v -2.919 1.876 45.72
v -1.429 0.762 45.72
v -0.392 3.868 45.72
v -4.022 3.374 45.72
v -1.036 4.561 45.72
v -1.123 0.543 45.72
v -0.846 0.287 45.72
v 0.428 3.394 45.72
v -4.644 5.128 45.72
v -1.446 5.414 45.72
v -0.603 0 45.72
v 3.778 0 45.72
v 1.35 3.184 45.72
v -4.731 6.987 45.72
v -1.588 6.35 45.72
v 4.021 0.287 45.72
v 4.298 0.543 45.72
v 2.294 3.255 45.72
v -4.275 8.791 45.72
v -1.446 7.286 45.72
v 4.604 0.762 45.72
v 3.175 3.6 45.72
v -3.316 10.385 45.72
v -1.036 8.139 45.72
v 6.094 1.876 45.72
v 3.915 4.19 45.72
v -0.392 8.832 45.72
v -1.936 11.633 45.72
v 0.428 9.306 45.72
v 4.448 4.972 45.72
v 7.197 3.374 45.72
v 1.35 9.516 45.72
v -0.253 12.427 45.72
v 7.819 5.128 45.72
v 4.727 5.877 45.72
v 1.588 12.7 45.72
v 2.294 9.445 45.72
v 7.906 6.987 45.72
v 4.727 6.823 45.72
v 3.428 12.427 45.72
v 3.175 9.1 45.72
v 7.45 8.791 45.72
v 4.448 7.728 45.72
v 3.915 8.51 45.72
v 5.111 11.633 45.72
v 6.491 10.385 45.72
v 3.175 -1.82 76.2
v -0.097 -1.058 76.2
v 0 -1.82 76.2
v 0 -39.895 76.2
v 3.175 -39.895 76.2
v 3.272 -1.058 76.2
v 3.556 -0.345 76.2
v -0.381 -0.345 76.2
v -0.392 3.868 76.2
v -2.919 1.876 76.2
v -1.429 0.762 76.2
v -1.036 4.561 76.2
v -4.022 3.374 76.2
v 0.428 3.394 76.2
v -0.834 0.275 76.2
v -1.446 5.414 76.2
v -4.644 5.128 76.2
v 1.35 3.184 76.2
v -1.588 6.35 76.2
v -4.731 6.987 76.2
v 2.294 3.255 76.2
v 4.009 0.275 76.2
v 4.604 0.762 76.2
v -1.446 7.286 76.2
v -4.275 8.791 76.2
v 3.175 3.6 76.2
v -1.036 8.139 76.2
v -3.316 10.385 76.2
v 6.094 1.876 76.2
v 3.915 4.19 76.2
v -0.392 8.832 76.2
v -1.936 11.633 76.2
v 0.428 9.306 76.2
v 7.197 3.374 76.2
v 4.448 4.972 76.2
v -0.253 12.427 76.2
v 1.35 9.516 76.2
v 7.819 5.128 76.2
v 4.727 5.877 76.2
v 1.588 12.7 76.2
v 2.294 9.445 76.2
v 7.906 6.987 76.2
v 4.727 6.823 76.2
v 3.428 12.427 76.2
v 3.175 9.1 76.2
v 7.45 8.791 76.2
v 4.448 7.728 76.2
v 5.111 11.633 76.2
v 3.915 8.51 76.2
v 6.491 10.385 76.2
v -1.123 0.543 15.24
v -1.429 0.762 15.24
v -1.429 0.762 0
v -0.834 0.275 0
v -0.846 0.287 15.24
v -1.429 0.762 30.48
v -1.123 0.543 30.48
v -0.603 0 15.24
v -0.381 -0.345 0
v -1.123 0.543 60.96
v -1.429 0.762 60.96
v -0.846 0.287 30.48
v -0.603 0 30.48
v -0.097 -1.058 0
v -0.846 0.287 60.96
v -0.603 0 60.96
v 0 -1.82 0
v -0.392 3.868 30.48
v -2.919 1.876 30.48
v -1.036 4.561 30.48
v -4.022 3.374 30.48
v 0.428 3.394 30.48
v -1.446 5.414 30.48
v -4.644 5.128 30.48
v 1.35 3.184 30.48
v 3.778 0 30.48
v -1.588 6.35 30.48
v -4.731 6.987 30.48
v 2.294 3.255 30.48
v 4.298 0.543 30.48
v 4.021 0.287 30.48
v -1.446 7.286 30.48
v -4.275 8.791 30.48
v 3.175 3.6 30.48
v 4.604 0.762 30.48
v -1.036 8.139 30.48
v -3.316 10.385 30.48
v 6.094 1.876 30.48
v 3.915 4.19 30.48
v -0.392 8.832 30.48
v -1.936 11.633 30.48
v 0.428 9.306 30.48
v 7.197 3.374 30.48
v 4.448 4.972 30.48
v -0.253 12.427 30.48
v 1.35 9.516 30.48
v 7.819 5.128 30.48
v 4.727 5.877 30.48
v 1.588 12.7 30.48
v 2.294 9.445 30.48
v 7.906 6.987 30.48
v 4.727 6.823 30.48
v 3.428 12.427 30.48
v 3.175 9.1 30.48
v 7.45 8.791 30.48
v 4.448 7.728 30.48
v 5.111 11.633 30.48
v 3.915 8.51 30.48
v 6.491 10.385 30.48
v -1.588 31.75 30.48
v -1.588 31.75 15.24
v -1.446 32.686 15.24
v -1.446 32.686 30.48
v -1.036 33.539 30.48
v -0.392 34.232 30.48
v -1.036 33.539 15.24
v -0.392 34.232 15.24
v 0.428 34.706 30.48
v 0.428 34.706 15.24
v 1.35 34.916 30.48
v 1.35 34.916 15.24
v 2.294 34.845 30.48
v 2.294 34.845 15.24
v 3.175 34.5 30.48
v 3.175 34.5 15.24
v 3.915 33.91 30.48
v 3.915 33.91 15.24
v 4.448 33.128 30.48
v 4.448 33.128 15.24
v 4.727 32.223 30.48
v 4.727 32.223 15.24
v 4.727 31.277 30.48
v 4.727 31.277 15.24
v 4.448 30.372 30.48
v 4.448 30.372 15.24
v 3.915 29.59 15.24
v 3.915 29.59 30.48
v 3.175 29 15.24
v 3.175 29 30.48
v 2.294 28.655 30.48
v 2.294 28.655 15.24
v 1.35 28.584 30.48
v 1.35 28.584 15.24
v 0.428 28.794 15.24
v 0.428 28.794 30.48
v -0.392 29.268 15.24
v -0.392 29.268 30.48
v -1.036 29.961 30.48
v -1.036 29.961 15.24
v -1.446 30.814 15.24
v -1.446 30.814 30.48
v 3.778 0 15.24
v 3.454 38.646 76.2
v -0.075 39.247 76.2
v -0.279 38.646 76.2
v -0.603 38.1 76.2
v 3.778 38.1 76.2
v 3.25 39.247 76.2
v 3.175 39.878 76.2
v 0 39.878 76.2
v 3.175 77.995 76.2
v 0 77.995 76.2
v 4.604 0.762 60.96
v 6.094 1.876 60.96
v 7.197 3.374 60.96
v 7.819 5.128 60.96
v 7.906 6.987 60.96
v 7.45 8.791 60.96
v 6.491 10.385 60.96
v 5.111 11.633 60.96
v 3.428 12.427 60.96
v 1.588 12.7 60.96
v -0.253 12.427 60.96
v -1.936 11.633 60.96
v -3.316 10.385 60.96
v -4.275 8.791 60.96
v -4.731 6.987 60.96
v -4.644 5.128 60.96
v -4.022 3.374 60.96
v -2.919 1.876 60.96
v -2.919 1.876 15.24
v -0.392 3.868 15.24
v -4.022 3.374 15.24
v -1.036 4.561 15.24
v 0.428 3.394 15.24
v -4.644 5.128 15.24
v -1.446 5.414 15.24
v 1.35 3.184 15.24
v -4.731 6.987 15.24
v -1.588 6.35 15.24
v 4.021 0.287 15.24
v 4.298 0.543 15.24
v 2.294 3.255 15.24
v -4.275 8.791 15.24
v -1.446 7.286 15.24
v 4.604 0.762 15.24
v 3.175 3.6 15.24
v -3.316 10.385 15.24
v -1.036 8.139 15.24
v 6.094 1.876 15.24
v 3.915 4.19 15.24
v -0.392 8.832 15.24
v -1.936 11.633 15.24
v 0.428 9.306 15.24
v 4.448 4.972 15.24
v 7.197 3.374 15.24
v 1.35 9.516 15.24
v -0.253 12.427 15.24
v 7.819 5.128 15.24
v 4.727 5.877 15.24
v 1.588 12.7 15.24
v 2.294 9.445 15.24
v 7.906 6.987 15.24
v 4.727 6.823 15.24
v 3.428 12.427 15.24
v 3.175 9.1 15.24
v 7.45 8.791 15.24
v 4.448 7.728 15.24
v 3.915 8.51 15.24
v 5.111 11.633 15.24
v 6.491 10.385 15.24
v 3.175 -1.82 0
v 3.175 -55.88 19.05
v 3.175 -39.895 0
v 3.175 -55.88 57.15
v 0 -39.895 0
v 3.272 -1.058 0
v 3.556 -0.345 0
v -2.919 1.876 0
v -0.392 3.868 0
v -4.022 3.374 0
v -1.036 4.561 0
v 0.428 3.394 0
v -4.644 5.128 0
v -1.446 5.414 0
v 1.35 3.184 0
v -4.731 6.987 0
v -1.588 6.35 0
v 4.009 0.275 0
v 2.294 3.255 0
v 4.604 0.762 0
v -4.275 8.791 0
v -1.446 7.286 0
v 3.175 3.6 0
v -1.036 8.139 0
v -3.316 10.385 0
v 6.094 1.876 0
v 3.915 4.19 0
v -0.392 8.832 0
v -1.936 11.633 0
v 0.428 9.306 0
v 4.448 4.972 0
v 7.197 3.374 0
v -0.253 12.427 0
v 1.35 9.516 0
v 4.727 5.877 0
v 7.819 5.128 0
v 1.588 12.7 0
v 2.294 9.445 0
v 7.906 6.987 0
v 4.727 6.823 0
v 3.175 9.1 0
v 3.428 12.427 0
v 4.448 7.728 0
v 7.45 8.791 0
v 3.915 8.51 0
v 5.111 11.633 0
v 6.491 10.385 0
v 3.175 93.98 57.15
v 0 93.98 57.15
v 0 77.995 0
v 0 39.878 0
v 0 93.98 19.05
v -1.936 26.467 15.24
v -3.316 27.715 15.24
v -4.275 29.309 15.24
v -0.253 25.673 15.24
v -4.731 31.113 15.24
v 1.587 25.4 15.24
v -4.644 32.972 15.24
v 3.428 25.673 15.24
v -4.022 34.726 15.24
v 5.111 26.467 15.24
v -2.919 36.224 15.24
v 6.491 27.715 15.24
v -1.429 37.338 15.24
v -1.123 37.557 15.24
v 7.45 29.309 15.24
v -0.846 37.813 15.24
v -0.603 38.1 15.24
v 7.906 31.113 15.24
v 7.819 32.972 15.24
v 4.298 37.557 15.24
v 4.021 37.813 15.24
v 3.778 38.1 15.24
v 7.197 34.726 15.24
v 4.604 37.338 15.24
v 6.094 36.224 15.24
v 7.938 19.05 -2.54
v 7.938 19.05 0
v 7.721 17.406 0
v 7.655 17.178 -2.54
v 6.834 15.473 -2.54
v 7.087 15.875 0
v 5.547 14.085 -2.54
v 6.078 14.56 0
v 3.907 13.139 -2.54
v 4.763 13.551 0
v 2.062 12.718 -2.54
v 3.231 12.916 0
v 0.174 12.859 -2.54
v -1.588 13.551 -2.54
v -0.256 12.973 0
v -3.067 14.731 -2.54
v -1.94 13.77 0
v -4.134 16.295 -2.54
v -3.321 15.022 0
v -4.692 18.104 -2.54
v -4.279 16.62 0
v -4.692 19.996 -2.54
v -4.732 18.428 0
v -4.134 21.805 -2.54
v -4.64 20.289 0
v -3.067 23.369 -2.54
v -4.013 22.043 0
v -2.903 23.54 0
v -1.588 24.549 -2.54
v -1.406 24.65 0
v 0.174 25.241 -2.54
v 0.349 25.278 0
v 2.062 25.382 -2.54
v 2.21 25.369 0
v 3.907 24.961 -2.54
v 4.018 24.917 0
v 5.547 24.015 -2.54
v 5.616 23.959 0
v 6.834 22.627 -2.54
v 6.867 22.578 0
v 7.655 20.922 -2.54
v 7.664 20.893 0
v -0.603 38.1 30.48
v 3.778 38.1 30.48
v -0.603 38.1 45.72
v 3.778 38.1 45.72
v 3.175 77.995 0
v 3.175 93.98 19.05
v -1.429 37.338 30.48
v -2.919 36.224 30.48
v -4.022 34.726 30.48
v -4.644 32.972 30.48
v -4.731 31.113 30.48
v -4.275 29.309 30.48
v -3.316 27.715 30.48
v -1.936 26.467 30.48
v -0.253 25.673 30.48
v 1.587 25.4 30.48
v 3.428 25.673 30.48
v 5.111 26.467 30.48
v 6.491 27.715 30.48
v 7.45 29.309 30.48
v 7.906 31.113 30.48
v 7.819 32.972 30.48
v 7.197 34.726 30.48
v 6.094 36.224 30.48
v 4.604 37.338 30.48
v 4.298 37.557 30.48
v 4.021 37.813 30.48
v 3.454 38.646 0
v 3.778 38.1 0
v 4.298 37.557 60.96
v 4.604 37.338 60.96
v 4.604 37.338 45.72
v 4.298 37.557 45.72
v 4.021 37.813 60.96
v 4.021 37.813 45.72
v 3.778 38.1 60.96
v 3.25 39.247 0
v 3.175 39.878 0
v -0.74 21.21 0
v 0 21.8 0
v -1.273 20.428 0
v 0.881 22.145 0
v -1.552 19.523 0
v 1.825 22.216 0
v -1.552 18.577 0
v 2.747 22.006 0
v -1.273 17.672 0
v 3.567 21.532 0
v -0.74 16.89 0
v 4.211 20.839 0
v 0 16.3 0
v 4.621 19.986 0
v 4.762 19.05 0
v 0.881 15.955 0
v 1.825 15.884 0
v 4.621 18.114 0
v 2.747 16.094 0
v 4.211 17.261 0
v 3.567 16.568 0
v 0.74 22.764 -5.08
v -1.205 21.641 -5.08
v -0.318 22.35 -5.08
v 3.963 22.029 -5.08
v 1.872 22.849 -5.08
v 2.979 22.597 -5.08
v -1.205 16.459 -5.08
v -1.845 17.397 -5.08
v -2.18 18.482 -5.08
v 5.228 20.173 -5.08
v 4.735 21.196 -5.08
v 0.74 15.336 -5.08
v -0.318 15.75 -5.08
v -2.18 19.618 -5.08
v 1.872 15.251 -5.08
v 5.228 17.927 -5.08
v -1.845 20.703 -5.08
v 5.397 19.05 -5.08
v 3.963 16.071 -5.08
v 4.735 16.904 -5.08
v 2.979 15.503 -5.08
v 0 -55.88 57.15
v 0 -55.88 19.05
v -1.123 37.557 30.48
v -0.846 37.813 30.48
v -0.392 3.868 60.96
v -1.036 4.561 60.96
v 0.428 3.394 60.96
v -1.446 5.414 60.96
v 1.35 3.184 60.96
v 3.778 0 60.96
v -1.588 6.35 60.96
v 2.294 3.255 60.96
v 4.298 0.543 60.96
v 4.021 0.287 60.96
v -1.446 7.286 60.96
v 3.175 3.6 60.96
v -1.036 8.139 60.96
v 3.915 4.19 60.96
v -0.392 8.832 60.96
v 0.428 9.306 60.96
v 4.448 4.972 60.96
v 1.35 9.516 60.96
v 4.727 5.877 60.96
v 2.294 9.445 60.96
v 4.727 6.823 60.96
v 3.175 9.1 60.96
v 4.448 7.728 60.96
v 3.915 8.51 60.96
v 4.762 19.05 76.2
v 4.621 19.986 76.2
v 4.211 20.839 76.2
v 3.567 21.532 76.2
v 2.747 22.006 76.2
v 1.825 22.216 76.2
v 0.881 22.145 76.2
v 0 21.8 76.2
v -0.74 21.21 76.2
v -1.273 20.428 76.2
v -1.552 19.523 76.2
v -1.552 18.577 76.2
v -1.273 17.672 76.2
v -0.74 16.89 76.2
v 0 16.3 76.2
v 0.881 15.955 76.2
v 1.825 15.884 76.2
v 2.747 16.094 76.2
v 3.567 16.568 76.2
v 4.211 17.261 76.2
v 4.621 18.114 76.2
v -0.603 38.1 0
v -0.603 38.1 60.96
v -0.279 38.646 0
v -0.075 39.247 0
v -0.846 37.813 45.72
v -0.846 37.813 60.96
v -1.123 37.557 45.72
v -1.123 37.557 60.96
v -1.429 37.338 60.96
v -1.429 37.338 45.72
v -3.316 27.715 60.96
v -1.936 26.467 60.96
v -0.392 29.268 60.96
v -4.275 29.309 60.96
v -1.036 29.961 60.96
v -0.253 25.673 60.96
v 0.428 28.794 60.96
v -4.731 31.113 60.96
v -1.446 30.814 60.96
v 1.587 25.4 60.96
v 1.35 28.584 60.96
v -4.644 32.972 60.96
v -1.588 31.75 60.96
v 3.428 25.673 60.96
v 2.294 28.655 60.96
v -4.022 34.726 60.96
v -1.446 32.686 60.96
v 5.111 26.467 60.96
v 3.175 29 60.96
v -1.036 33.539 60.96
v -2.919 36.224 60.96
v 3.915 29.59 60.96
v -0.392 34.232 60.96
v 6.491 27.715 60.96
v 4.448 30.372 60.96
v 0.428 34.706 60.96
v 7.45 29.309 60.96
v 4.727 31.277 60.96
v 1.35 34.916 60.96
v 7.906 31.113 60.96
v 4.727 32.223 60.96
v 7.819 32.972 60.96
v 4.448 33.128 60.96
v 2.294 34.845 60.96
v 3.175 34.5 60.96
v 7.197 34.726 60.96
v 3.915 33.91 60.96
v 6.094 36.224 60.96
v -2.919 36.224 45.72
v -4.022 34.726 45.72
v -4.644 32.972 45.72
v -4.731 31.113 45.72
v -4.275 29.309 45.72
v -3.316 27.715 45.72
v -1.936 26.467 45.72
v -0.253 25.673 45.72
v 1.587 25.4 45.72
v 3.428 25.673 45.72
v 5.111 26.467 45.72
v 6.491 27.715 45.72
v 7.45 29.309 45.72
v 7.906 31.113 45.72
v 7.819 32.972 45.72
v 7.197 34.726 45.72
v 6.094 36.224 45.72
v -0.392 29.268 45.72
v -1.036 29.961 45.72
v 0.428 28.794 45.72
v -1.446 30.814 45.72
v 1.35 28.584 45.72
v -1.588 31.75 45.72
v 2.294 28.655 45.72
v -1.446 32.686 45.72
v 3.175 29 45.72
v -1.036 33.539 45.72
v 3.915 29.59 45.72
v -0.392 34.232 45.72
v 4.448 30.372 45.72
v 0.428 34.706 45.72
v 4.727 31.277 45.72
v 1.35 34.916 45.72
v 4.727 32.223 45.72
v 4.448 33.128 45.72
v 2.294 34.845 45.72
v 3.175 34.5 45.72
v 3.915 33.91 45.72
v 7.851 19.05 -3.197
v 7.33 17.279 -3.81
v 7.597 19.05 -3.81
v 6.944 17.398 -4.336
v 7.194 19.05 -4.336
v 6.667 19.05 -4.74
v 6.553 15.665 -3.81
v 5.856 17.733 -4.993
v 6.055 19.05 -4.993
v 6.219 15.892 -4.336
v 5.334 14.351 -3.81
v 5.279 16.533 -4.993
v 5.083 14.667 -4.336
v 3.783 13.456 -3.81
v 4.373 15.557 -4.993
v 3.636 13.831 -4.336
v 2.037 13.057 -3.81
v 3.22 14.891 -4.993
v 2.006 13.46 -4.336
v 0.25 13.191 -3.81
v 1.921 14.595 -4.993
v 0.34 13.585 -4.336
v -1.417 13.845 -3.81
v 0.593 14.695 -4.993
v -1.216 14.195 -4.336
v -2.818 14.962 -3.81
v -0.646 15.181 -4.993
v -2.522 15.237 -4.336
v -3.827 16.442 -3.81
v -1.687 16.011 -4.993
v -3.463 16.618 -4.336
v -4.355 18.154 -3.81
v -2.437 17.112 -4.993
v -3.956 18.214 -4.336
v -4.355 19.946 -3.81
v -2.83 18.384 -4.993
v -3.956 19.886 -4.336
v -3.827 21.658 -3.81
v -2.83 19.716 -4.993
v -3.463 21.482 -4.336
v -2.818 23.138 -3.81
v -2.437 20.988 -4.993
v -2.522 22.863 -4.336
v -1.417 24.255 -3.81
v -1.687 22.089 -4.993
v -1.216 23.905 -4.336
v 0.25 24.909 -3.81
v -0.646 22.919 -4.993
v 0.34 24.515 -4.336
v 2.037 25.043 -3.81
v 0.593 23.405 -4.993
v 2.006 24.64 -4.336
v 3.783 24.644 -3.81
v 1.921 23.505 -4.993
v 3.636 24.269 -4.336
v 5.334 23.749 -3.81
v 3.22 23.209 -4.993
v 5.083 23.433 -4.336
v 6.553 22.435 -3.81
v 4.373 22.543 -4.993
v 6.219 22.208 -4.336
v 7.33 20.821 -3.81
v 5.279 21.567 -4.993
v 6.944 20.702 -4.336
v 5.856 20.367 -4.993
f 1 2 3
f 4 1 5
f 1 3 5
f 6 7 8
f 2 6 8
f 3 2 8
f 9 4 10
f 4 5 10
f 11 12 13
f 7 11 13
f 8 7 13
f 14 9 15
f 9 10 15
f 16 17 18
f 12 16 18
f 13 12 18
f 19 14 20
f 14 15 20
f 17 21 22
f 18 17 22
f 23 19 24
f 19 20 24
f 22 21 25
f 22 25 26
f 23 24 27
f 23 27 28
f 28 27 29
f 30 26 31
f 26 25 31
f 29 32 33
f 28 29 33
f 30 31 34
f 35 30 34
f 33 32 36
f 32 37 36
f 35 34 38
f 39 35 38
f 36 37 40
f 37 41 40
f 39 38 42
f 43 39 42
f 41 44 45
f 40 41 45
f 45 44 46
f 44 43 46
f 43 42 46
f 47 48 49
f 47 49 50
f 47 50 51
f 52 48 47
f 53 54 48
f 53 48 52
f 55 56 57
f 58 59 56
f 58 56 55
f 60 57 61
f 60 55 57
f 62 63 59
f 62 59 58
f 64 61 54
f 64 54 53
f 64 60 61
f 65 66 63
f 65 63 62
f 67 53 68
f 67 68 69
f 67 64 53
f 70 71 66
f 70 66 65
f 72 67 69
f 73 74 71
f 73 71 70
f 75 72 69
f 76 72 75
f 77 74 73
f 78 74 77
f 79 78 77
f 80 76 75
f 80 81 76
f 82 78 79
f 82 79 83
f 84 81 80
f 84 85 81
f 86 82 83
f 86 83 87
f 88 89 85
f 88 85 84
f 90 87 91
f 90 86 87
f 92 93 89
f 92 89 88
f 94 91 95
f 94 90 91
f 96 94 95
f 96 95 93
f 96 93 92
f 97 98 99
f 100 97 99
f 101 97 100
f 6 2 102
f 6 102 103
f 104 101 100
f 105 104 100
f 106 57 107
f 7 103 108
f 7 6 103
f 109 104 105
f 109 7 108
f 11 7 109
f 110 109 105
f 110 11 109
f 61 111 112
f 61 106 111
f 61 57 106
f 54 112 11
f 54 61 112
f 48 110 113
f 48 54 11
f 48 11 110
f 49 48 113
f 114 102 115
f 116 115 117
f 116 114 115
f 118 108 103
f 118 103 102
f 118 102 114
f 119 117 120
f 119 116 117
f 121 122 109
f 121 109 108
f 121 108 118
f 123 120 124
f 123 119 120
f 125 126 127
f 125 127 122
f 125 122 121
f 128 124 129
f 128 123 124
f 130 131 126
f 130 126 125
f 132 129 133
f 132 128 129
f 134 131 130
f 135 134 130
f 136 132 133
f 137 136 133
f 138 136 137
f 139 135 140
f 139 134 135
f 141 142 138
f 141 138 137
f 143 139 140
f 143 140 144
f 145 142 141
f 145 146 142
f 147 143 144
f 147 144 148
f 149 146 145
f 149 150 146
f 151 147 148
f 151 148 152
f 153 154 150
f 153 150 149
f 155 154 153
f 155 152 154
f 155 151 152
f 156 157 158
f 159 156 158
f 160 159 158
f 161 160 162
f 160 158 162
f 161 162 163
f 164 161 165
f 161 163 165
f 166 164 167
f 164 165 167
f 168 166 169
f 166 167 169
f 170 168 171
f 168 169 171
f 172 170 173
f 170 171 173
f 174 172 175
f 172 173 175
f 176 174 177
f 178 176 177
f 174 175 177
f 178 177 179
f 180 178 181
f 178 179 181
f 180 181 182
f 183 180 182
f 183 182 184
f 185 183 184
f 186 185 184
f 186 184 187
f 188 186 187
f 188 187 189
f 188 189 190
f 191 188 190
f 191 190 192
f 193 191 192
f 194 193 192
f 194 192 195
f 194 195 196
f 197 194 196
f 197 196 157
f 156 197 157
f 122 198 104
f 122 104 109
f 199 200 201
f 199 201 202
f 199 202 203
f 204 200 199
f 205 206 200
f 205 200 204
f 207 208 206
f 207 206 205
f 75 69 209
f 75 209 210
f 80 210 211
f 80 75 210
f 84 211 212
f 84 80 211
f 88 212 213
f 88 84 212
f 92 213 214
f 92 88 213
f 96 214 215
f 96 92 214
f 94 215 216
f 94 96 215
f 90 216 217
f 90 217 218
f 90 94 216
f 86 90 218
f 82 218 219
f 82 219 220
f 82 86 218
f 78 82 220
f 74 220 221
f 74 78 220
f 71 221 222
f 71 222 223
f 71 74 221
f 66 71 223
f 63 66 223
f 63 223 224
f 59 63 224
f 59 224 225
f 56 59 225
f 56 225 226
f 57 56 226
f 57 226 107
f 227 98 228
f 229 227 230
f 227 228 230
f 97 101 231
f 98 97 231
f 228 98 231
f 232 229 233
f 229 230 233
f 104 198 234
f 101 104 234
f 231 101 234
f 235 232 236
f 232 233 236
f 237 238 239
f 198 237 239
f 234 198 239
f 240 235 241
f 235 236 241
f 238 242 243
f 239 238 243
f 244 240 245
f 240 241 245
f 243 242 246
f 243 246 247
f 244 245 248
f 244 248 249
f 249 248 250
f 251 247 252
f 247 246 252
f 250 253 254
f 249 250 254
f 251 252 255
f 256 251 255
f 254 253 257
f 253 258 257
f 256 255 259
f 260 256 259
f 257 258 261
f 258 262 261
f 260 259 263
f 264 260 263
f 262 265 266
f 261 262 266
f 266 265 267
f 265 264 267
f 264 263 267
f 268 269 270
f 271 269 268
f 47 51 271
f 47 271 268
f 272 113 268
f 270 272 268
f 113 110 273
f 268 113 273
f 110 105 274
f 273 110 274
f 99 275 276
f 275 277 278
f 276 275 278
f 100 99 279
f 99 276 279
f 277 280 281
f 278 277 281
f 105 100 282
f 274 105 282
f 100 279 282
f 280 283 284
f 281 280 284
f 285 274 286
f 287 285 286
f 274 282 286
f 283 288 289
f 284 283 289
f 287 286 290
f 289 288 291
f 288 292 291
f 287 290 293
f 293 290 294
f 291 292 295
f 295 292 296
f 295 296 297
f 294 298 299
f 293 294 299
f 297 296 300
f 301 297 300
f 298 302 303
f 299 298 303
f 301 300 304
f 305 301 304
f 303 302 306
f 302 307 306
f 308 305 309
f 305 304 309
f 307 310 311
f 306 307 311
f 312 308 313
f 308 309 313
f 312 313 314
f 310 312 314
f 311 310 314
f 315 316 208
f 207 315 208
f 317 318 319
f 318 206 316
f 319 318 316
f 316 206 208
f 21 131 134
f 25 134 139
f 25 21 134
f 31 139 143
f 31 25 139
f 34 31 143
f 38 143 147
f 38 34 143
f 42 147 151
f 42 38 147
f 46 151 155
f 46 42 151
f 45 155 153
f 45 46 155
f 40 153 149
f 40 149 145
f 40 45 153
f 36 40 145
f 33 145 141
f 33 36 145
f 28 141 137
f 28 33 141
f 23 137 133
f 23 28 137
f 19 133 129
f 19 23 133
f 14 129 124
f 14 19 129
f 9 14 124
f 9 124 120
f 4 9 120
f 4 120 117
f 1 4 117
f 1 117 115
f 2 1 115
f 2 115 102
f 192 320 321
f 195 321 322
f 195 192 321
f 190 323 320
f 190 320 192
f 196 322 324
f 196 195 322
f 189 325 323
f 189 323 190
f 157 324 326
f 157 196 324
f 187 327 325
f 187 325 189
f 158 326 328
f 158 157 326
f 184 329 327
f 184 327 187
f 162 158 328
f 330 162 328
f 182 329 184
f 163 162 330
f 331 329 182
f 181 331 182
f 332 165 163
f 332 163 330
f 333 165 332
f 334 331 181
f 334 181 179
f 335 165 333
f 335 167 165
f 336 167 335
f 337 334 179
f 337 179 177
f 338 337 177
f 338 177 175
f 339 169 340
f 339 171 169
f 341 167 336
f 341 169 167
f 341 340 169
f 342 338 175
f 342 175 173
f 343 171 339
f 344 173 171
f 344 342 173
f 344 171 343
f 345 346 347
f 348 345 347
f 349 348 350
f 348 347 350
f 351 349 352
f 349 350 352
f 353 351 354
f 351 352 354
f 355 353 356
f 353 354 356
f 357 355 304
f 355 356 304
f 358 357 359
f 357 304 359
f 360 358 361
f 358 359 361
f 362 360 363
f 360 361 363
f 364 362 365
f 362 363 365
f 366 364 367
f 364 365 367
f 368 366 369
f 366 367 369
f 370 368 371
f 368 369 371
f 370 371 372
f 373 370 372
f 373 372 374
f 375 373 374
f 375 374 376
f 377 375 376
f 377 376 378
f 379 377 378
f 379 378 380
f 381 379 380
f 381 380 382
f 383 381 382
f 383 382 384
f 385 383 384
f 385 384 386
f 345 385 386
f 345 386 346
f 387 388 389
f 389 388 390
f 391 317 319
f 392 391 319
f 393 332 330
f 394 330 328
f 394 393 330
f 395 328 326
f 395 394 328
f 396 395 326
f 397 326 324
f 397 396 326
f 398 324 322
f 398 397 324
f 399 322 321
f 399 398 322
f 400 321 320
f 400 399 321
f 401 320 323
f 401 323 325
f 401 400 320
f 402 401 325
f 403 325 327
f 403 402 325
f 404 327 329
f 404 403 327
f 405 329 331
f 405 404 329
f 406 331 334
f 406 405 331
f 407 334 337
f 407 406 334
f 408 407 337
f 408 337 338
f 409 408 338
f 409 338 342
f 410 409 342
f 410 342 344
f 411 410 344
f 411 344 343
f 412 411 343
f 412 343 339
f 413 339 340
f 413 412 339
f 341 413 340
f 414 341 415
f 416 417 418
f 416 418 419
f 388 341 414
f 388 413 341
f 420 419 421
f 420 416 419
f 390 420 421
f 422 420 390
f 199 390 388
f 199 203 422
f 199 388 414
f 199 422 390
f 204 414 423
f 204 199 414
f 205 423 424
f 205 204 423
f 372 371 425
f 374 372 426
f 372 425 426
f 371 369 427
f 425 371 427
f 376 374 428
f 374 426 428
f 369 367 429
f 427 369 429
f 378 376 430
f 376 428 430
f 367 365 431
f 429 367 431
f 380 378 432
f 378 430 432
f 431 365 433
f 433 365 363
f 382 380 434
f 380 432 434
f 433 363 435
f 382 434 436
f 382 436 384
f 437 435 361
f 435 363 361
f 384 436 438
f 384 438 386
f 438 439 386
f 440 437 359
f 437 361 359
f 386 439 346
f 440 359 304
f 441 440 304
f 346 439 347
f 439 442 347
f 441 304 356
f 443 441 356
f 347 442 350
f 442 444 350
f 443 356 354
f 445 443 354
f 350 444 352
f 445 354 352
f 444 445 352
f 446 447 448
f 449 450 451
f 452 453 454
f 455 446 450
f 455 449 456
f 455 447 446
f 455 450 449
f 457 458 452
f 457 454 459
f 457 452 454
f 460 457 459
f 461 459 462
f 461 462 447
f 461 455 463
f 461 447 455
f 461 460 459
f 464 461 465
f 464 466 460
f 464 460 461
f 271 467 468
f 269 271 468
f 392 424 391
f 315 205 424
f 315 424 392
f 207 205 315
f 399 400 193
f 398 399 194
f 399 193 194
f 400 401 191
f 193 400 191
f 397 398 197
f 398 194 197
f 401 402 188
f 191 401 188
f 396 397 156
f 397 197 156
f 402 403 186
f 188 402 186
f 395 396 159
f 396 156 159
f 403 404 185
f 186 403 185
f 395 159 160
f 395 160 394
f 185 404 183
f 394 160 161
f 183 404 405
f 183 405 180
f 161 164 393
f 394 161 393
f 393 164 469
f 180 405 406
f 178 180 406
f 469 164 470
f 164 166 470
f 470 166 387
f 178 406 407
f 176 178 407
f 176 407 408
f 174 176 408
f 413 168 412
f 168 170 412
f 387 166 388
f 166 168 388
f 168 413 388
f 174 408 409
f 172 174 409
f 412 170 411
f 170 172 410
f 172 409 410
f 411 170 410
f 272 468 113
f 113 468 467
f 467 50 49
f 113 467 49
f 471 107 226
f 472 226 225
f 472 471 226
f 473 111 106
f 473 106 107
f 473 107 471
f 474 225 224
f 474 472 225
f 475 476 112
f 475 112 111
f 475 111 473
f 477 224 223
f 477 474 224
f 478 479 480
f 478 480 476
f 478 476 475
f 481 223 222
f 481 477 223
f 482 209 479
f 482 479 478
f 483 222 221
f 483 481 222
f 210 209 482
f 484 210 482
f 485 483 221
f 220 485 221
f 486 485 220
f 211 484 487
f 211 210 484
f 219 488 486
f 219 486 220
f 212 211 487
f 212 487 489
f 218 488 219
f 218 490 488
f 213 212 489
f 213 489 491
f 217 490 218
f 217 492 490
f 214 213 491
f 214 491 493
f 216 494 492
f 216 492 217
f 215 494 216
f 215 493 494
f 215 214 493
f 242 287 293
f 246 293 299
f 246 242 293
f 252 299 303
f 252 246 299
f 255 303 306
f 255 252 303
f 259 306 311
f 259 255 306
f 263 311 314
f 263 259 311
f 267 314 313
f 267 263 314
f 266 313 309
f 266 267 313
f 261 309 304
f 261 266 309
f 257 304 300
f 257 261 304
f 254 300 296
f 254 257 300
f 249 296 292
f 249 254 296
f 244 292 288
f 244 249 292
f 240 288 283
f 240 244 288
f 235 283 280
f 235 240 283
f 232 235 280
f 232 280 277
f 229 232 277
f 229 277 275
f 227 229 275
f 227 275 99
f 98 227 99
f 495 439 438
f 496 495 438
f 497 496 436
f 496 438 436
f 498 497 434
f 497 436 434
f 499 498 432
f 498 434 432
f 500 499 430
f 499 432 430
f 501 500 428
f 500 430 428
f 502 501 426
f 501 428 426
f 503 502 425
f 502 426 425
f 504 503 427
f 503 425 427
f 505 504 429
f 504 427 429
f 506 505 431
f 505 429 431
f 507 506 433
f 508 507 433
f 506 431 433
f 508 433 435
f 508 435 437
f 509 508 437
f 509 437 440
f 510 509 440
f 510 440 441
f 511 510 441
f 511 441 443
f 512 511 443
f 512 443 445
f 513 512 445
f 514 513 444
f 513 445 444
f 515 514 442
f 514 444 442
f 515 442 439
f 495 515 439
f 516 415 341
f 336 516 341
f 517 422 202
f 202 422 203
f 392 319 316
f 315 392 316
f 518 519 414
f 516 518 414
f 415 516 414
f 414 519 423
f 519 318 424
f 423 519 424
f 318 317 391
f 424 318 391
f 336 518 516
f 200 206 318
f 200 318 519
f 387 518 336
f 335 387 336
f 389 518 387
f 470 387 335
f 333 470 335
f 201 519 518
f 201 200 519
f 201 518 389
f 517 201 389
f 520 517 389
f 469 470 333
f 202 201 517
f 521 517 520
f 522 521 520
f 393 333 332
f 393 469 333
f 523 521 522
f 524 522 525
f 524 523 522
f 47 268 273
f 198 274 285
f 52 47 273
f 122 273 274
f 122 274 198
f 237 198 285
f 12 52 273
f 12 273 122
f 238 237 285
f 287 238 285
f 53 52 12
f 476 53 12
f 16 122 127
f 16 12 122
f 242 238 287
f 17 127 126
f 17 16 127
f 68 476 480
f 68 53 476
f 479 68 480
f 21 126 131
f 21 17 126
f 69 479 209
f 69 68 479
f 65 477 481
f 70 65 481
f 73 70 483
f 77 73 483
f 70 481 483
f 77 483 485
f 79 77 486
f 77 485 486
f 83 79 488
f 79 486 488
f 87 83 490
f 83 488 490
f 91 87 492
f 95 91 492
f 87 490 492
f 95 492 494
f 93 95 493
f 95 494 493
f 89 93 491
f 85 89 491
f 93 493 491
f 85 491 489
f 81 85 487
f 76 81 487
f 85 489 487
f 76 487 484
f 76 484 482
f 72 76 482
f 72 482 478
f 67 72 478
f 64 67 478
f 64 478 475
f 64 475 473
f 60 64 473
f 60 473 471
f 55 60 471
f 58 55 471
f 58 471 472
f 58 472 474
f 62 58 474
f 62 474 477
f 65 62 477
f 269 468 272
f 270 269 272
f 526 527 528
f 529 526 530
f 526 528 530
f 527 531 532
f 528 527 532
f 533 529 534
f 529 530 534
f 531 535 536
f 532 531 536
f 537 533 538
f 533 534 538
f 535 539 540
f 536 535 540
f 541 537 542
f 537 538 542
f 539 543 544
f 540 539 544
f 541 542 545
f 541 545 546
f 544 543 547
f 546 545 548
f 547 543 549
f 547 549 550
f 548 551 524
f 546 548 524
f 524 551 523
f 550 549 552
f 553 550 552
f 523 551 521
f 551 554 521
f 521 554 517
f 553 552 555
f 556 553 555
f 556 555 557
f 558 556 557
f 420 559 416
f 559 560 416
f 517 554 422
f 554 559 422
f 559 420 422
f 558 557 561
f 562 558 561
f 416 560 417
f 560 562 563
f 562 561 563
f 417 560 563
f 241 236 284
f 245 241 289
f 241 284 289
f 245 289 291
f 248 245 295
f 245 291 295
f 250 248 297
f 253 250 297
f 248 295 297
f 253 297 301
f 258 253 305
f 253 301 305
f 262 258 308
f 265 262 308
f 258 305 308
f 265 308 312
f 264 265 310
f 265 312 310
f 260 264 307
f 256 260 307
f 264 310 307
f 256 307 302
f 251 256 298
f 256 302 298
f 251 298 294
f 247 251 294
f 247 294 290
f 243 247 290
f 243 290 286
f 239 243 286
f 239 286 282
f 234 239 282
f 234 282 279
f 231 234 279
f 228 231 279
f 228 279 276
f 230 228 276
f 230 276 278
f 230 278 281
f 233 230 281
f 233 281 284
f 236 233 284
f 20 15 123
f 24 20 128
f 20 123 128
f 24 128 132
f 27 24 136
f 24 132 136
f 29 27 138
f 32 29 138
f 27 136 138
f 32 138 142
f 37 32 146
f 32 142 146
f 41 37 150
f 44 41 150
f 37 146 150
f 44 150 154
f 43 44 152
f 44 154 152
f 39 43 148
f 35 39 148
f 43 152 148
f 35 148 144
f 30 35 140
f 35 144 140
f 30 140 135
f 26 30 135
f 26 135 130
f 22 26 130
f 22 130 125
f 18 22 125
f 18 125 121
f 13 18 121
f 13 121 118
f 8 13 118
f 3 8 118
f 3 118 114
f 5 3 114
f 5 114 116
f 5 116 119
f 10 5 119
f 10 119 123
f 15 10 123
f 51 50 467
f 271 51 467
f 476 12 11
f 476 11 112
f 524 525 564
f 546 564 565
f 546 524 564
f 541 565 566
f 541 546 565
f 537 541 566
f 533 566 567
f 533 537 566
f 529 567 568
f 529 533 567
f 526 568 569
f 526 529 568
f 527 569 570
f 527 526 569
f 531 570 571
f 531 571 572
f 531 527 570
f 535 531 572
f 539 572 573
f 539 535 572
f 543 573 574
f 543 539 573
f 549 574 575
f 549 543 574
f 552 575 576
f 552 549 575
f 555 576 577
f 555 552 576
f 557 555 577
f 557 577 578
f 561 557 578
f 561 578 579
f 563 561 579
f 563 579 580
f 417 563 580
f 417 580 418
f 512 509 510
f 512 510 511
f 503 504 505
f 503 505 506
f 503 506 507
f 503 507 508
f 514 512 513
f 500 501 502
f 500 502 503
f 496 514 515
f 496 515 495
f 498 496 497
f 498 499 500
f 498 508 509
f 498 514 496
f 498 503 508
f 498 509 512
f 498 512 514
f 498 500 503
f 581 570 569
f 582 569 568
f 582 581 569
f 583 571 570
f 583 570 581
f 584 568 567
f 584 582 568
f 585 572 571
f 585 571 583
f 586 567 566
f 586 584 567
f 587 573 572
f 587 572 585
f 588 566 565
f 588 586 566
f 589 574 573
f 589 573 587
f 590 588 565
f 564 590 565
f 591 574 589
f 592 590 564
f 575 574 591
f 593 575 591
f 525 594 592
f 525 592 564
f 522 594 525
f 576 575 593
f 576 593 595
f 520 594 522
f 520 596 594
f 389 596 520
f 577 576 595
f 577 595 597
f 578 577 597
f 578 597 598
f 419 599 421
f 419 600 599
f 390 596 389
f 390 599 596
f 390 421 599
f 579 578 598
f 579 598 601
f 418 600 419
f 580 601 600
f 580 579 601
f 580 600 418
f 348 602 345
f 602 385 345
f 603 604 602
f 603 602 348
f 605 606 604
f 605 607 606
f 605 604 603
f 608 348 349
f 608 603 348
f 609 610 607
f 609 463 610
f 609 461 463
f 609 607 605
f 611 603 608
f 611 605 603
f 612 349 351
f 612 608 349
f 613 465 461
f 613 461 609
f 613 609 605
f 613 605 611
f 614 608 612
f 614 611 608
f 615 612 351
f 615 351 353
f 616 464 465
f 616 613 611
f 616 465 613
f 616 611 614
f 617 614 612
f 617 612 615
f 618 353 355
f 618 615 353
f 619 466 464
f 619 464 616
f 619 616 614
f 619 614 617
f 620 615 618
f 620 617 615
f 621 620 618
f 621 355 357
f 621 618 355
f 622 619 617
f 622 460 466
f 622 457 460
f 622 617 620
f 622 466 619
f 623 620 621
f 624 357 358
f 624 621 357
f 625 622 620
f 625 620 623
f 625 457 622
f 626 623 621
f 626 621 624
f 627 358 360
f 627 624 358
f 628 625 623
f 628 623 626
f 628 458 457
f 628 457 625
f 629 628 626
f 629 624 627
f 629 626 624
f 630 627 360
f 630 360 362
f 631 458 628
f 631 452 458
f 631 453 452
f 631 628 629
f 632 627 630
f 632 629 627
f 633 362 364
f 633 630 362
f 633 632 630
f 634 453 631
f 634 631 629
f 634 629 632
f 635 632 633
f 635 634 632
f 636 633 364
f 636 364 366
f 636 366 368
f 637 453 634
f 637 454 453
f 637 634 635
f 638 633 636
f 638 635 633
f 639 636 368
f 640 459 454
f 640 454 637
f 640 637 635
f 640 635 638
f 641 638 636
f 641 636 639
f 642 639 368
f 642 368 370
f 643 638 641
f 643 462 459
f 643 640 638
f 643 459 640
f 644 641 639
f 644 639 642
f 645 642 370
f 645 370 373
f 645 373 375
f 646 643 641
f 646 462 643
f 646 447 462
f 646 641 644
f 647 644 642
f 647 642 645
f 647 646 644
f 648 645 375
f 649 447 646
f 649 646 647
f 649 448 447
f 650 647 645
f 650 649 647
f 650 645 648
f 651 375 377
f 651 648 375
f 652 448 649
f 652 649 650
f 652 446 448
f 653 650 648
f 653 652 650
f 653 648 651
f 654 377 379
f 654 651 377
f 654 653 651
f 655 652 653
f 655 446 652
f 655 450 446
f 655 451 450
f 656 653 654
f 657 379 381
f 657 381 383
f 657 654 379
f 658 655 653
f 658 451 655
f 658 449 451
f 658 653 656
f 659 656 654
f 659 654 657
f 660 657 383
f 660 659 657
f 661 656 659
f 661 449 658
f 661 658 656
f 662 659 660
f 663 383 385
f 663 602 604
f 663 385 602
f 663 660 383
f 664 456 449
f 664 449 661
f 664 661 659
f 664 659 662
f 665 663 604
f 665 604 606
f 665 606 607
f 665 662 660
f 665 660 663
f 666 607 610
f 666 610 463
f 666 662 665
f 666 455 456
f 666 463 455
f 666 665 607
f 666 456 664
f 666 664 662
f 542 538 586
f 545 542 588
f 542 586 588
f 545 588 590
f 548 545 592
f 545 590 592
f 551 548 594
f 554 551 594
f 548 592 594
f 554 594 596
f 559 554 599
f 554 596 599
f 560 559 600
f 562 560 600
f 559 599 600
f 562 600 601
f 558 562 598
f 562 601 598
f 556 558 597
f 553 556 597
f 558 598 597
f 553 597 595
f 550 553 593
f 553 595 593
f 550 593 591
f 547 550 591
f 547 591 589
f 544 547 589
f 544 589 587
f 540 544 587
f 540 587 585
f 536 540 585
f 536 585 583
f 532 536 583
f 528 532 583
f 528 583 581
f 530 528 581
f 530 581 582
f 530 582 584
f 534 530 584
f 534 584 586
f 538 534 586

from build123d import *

# Parameters (mm, degrees)
F1_DEPTH  = 3.175
F3_DEPTH  = 76.2
F5_D      = 6.35
F7_W      = 12.7
F7_H      = 15.24
F8_DEPTH  = 19.05
F10_DEPTH = 3.175
F12_DEPTH = 76.2
F14_D     = 6.35
F15_W     = 12.7
F15_H     = 15.24
F16_DEPTH = 19.05
F17_R     = 3.175
F18_DEPTH = 76.2
F19_R     = 6.35
F20_DEPTH = 5.08
F21_R     = 2.54


with BuildPart() as f1:
    # F0 (on Right) → F1 (new body)
    with BuildSketch(Plane.YZ):
        Polygon((0, 0), (0, 76.2), (-39.895152, 76.2), (-55.88, 57.15), (-55.88, 19.05), (-39.895152, 0), align=None)
    extrude(amount=F1_DEPTH)

    # F2 (on face) → F3 (join)
    with BuildSketch(Plane.XY.offset(76.2)):
        with BuildLine():
            ThreePointArc((3.175, -1.820207), (3.555952, -0.344686), (4.603583, 0.762))
            ThreePointArc((4.603583, 0.762), (1.5875, 12.7), (-1.428583, 0.762))
            ThreePointArc((-1.428583, 0.762), (-0.380952, -0.344686), (0, -1.820207))
            Line((0, -1.820207), (0, 0))
            Line((0, 0), (3.175, 0))
            Line((3.175, 0), (3.175, -1.820207))
        make_face()
    extrude(amount=-F3_DEPTH)

    # F5 (through all)
    with Locations(Plane.XY.offset(76.2)):
        with Locations((1.5875, 6.35)):
            Hole(F5_D / 2)

    # F7 (on offset) → F8 (cut)
    with BuildSketch(Plane.YZ.offset(12.7)):
        with Locations((6.35, 22.86)):
            Rectangle(F7_W, F7_H)
        with Locations((6.35, 53.34)):
            Rectangle(F7_W, F7_H)
    extrude(amount=-F8_DEPTH, mode=Mode.SUBTRACT)



with BuildPart() as f10:
    # F9 (on Right) → F10 (new body)
    with BuildSketch(Plane.YZ):
        Polygon((93.98, 57.15), (77.995152, 76.2), (38.1, 76.2), (38.1, 0), (77.995152, 0), (93.98, 19.05), align=None)
    extrude(amount=F10_DEPTH)

    # F11 (on face) → F12 (join)
    with BuildSketch(Plane.XY.offset(76.2)):
        with BuildLine():
            ThreePointArc((0, 39.878), (-0.391068, 38.426208), (-1.428583, 37.338))
            ThreePointArc((-1.428583, 37.338), (1.5875, 25.4), (4.603583, 37.338))
            ThreePointArc((4.603583, 37.338), (3.566068, 38.426208), (3.175, 39.878))
            Line((3.175, 39.878), (3.175, 38.1))
            Line((3.175, 38.1), (0, 38.1))
            Line((0, 38.1), (0, 39.878))
        make_face()
    extrude(amount=-F12_DEPTH)

    # F14 (through all)
    with Locations(Plane.XY.offset(76.2)):
        with Locations((1.5875, 31.75)):
            Hole(F14_D / 2)

    # F15 (on offset) → F16 (cut)
    with BuildSketch(Plane.YZ.offset(12.7)):
        with Locations((31.75, 68.58)):
            Rectangle(F15_W, F15_H)
        with Locations((31.75, 38.1)):
            Rectangle(F15_W, F15_H)
        with Locations((31.75, 7.62)):
            Rectangle(F15_W, F15_H)
    extrude(amount=-F16_DEPTH, mode=Mode.SUBTRACT)


with BuildPart() as f18:
    # F17 (on Top) → F18 (new body)
    with BuildSketch(Plane.XY):
        with Locations((1.5875, 19.05)):
            Circle(F17_R)
    extrude(amount=F18_DEPTH)


with BuildPart() as f1_1:
    add(f1.part)

    add(f18.part)  # F20 merges F18
    # F19 (on face) → F20 (join)
    with BuildSketch(Plane(origin=(0, 0, 0), x_dir=(1, 0, 0), z_dir=(0, 0, -1))):
        with Locations((1.5875, -19.05)):
            Circle(F19_R)
    extrude(amount=F20_DEPTH)

    # F21
    f21_edges = [f1_1.edges().sort_by_distance(p)[0] for p in [
        (-4.7625, 19.05, -5.08),
    ]]
    fillet(f21_edges, radius=F21_R)


solid = Compound([f10.part, f1_1.part])
